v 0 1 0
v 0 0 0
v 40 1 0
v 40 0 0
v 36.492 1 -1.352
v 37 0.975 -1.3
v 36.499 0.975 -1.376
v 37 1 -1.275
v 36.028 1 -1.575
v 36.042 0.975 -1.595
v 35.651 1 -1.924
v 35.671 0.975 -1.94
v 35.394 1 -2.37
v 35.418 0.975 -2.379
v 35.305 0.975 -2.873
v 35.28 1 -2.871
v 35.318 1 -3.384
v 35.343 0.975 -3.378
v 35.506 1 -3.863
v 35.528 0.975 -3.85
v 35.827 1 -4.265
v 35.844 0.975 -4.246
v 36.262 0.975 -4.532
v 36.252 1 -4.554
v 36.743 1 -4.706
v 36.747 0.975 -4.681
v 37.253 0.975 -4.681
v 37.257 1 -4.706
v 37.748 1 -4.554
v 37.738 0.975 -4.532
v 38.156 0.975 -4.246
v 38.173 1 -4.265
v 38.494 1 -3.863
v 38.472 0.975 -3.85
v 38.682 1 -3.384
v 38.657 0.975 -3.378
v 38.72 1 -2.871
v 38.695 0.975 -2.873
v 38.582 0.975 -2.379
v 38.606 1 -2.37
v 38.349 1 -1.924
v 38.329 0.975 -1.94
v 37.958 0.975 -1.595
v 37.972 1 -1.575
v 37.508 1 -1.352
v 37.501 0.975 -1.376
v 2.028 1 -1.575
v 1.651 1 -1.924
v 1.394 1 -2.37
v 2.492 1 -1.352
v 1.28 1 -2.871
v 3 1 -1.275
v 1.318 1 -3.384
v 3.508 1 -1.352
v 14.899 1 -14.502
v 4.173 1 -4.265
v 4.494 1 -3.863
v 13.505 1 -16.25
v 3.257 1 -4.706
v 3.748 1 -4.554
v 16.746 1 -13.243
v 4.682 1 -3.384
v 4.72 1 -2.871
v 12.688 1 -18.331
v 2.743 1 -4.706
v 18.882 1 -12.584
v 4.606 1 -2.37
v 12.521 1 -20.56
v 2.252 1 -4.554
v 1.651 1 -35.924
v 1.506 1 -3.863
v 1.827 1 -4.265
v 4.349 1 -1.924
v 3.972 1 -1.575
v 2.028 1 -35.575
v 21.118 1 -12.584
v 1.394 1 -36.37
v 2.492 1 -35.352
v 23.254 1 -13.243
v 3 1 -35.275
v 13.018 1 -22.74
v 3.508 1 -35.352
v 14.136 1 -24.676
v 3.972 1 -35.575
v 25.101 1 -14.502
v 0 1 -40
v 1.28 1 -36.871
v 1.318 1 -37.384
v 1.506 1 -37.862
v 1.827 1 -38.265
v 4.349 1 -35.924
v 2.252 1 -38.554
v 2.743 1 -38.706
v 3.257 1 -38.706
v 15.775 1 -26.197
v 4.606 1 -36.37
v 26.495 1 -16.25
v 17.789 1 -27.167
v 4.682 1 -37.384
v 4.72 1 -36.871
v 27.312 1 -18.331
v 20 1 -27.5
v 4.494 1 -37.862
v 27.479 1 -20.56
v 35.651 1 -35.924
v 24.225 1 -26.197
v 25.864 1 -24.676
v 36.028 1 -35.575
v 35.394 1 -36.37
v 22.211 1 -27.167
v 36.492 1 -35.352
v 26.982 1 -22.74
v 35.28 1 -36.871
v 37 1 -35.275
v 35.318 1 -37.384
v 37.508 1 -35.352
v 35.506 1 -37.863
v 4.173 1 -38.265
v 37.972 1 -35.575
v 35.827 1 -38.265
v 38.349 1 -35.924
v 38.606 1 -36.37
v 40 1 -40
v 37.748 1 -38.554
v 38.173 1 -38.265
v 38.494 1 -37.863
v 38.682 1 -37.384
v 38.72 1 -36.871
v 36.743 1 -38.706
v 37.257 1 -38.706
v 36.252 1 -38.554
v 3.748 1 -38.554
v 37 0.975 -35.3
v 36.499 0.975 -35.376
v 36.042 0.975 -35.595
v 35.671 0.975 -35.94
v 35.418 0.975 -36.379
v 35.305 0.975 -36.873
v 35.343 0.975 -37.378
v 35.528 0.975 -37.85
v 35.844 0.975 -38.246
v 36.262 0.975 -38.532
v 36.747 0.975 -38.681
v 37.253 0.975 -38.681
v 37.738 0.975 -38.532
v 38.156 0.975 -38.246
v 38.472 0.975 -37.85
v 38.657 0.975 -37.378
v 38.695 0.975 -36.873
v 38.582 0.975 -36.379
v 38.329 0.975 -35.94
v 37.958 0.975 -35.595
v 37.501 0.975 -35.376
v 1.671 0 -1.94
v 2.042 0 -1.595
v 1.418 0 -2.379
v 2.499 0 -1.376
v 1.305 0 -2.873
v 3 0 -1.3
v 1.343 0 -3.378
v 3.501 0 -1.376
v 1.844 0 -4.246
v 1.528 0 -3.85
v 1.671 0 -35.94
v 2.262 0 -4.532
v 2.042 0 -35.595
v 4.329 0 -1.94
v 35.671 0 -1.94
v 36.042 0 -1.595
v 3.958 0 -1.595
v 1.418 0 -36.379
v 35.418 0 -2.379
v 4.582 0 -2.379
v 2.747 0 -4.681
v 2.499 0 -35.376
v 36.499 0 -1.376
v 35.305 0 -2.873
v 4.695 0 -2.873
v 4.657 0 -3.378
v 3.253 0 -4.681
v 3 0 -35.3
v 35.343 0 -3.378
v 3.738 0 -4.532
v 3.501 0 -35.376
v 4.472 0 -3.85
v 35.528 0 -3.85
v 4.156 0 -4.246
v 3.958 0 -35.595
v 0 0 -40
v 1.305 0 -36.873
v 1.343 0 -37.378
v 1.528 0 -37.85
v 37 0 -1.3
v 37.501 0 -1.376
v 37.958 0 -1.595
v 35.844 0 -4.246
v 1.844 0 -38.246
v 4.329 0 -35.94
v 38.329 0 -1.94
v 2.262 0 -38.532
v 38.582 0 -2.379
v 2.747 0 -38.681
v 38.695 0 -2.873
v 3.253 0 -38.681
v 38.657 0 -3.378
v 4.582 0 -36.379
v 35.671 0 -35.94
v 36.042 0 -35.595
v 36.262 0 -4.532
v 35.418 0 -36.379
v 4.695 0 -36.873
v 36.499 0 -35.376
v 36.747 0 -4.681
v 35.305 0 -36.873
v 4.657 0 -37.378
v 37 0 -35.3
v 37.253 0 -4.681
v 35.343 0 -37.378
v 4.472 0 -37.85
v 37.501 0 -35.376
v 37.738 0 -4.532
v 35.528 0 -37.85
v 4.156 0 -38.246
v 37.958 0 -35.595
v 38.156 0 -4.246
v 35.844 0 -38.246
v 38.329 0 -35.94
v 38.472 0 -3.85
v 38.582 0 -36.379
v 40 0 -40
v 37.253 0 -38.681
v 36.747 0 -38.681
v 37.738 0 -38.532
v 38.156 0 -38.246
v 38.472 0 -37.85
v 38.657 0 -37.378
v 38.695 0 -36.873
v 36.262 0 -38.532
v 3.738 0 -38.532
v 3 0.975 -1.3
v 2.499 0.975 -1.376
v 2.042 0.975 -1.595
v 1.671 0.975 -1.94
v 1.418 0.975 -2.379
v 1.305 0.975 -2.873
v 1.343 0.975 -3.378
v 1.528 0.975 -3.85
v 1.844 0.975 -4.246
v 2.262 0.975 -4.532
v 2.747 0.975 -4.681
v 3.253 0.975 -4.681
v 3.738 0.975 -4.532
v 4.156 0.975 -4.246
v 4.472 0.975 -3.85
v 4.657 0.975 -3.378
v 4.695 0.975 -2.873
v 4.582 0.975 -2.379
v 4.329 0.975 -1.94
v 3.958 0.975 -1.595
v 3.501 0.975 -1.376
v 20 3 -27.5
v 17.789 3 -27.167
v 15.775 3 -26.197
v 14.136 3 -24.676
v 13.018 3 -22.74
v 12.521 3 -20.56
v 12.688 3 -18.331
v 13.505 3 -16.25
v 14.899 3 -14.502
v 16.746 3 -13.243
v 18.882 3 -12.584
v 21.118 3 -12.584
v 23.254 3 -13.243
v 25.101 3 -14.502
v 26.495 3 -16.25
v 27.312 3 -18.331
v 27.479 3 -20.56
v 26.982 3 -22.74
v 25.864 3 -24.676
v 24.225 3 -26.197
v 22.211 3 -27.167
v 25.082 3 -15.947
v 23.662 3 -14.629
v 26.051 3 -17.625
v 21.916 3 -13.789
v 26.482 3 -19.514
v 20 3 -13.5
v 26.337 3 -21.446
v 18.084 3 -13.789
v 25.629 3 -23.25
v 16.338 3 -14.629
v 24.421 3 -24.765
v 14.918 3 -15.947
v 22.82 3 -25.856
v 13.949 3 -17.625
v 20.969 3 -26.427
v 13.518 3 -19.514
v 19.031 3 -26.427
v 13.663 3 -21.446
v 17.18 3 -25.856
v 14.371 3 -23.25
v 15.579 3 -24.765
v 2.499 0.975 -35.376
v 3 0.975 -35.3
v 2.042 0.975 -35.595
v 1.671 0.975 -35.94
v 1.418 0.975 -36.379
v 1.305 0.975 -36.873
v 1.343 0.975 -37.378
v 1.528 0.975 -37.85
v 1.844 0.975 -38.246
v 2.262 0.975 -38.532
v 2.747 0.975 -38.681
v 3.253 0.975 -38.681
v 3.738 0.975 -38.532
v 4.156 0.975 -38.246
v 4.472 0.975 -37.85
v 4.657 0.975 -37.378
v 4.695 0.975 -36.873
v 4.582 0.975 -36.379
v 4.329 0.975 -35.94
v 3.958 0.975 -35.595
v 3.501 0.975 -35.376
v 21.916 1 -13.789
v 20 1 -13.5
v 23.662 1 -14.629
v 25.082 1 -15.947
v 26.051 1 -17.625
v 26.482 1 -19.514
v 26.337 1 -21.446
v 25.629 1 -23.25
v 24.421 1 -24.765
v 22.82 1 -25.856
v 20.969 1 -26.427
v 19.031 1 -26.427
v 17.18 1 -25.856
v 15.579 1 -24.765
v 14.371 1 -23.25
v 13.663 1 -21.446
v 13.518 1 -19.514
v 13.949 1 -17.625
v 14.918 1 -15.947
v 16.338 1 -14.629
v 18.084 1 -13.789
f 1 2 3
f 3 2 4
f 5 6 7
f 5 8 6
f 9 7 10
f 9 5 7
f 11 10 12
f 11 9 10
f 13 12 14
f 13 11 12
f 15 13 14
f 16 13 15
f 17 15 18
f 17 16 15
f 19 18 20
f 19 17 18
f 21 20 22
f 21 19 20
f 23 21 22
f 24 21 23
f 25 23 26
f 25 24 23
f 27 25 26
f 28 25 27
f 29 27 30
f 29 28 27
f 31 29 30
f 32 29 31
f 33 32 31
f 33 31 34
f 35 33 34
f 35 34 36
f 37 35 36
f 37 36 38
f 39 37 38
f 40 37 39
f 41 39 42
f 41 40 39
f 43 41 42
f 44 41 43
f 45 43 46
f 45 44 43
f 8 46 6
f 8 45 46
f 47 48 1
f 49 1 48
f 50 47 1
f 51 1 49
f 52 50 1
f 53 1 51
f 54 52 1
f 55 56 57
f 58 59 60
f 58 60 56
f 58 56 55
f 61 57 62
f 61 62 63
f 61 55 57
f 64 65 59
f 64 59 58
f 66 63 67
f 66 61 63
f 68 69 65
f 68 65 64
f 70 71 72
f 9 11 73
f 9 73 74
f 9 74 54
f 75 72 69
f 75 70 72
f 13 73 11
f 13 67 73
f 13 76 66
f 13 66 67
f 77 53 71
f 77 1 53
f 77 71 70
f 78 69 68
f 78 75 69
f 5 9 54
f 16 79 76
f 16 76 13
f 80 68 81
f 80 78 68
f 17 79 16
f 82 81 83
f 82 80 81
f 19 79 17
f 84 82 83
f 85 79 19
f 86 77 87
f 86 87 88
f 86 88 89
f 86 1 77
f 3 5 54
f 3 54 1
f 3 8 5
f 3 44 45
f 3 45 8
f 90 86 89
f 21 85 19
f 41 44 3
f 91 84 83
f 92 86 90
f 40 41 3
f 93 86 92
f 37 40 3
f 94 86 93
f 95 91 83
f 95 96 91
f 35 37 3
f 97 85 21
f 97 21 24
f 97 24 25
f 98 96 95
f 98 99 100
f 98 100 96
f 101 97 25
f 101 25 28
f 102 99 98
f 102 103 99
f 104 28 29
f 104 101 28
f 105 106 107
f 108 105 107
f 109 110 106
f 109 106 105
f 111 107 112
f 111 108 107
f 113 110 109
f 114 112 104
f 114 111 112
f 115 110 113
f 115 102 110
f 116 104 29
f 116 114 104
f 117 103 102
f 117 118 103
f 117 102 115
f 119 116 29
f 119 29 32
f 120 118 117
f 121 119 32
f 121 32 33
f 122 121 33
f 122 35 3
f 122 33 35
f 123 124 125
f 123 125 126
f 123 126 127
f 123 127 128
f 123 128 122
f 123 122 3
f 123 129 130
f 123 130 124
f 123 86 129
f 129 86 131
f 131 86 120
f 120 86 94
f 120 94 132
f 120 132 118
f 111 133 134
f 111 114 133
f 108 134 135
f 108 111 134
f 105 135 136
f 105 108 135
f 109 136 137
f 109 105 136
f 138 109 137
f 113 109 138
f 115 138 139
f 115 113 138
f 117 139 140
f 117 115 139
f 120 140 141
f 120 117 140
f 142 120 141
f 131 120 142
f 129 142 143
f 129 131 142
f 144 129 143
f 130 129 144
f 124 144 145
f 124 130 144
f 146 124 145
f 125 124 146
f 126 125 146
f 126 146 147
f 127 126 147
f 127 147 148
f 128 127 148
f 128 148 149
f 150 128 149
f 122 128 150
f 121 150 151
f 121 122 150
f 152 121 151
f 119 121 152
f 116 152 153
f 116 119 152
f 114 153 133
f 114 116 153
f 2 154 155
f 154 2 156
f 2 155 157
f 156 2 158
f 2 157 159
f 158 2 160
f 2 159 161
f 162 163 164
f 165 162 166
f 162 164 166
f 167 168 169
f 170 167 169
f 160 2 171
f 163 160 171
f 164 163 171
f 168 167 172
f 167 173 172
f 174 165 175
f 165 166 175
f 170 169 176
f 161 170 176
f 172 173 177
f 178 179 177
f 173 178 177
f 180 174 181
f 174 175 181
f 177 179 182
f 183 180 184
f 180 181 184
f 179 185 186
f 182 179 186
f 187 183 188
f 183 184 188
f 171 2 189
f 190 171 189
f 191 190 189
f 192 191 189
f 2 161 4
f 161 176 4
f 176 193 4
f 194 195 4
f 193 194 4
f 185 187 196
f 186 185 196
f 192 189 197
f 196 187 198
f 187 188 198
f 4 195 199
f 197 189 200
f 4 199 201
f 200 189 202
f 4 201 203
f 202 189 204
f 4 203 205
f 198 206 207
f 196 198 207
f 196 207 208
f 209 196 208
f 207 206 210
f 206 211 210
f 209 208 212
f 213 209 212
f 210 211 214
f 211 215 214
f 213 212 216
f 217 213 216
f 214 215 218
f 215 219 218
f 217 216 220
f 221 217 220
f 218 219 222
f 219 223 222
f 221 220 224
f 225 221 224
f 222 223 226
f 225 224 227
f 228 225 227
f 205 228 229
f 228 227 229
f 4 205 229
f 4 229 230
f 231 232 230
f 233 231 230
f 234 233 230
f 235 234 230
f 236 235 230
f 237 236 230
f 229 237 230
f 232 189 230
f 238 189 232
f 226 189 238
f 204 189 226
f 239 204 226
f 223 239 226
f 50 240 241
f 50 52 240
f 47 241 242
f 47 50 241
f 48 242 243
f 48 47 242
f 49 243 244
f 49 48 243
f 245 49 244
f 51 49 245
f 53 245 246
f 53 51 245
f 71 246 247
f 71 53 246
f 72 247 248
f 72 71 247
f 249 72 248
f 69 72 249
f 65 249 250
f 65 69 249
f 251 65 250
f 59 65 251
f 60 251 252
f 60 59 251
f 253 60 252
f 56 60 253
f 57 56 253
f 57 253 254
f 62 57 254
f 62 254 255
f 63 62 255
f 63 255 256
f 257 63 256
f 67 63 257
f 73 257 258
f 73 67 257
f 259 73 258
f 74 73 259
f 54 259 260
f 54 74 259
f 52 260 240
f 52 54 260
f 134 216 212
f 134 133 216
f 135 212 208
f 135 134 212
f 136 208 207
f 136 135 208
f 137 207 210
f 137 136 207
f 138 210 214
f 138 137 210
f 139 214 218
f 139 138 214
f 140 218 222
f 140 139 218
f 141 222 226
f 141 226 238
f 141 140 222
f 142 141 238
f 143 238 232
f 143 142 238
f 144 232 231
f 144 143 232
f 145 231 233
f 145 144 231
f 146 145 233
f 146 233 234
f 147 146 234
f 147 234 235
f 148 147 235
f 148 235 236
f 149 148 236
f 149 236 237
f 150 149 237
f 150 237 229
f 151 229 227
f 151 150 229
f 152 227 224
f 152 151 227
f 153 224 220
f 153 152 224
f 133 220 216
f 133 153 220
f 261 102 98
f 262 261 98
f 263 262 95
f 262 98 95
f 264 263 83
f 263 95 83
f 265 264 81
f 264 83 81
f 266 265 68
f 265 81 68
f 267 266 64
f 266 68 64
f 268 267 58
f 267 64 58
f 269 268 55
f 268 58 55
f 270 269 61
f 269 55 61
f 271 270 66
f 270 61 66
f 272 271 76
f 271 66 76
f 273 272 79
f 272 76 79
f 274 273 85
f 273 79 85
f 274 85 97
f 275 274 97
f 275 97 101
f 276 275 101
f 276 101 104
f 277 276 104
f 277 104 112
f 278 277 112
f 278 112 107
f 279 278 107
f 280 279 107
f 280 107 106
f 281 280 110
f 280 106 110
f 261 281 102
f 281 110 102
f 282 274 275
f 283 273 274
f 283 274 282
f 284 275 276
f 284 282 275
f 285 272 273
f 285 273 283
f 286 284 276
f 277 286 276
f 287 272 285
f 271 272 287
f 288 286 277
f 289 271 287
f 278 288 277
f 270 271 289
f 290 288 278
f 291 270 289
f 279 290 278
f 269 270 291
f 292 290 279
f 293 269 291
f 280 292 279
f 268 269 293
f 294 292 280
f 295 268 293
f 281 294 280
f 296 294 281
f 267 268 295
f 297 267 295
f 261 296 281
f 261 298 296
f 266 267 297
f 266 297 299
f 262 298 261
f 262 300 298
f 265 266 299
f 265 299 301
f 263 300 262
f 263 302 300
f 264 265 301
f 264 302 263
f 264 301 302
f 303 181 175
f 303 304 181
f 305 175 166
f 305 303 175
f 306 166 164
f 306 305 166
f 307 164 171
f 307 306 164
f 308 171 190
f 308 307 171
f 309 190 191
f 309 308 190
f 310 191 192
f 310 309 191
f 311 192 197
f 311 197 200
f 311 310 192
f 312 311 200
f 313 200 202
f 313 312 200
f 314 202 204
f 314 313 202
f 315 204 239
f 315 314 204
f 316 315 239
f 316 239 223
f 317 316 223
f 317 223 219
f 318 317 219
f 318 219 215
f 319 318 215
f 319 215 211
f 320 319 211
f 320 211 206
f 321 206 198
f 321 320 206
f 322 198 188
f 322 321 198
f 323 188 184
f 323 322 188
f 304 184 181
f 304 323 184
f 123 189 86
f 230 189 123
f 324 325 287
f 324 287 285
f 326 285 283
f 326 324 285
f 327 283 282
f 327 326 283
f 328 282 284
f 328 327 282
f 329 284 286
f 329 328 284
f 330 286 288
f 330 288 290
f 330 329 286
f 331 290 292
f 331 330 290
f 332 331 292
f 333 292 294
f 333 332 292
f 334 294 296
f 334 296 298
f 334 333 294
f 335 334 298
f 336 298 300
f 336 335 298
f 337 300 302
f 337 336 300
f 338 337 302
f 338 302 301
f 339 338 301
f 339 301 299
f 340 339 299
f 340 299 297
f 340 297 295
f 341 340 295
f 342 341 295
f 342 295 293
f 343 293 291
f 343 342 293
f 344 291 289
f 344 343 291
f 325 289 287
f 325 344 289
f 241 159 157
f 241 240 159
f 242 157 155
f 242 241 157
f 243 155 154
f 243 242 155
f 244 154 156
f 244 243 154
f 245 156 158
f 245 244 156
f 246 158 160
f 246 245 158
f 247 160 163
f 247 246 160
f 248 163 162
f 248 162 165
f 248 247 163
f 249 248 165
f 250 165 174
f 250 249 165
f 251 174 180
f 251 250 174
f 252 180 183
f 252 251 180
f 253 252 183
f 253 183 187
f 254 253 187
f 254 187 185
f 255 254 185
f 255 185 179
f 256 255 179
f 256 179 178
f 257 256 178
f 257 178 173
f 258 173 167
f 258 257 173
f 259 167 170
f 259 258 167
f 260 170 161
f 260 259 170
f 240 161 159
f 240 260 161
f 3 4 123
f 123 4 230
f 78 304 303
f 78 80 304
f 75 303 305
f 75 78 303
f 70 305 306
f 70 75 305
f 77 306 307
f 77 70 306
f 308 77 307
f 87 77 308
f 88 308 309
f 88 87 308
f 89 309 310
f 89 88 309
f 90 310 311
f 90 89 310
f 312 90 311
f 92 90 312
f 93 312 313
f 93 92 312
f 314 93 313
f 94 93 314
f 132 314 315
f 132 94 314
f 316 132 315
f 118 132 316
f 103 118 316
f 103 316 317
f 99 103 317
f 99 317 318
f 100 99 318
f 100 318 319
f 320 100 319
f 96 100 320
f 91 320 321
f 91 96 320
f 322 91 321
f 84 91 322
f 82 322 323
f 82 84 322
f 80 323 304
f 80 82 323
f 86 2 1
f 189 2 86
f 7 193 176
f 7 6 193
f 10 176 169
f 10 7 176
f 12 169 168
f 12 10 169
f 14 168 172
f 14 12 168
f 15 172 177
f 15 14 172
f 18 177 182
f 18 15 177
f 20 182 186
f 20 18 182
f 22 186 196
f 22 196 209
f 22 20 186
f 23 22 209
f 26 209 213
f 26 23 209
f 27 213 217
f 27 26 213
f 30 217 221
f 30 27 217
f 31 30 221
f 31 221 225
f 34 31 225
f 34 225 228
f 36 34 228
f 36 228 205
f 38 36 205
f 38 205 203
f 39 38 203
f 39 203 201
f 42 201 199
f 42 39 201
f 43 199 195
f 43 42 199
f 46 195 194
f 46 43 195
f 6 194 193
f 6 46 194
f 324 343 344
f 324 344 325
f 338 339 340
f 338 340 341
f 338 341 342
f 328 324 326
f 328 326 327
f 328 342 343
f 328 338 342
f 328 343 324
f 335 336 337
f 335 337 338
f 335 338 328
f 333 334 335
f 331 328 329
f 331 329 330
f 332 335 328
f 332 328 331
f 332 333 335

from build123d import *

# Parameters (mm, degrees)
SKETCH1_W                     = 40
SKETCH1_H                     = 40
BOSS_EXTRUDE1_DEPTH           = 1
SKETCH2_R                     = 7.5
SKETCH2_R_2                   = 6.5
BOSS_EXTRUDE2_DEPTH           = 2
M3_CLEARANCE_HOLE1_AT_2_COUNT = 2
M3_CLEARANCE_HOLE1_AT_2_PITCH = 34
M3_CLEARANCE_HOLE1_AT_3_COUNT = 2
M3_CLEARANCE_HOLE1_AT_3_PITCH = 48.083261121
M3_CLEARANCE_HOLE1_AT_4_COUNT = 2
M3_CLEARANCE_HOLE1_AT_4_PITCH = 34


with BuildPart() as part:
    # Sketch1 → Boss-Extrude1 (new body)
    with BuildSketch(Plane(origin=(0, 0, 0), x_dir=(1, 0, 0), z_dir=(0, 1, 0))):
        with Locations((20, 20)):
            Rectangle(SKETCH1_W, SKETCH1_H)
    extrude(amount=BOSS_EXTRUDE1_DEPTH)

    # Sketch2 → Boss-Extrude2 (add)
    with BuildSketch(Plane(origin=(0, 1, 0), x_dir=(1, 0, 0), z_dir=(0, 1, 0))):
        with Locations(Location((20, 20, 0), (0, 0, 90))):
            Circle(SKETCH2_R)
        with Locations(Location((20, 20, 0), (0, 0, 270))):
            Circle(SKETCH2_R_2, mode=Mode.SUBTRACT)
    extrude(amount=BOSS_EXTRUDE2_DEPTH)

    # Sketch4 → M3 Clearance Hole1 (revolve, cut)
    with BuildSketch(Plane(origin=(3, 1, -3), x_dir=(0, 0, 1), z_dir=(1, 0, 0))):
        Polygon((0, 0), (0, 1), (1.7, 1), (1.7, 0.025), (1.725, 0), align=None)
    m3_clearance_hole1 = revolve(axis=Axis((3, 7.35, -3), (0, -1, 0)), mode=Mode.SUBTRACT)

    # M3 Clearance Hole1 at 2: M3 Clearance Hole1 ×2
    with Locations(*[(0, 0, -i * M3_CLEARANCE_HOLE1_AT_2_PITCH) for i in range(1, M3_CLEARANCE_HOLE1_AT_2_COUNT)]):
        add(m3_clearance_hole1, mode=Mode.SUBTRACT)

    # M3 Clearance Hole1 at 3: M3 Clearance Hole1 ×2
    with Locations(*[Vector(0.7071067811865477, 0, -0.7071067811865474) * (i * M3_CLEARANCE_HOLE1_AT_3_PITCH) for i in range(1, M3_CLEARANCE_HOLE1_AT_3_COUNT)]):
        add(m3_clearance_hole1, mode=Mode.SUBTRACT)

    # M3 Clearance Hole1 at 4: M3 Clearance Hole1 ×2
    with Locations(*[(i * M3_CLEARANCE_HOLE1_AT_4_PITCH, 0, 0) for i in range(1, M3_CLEARANCE_HOLE1_AT_4_COUNT)]):
        add(m3_clearance_hole1, mode=Mode.SUBTRACT)


solid = part.part
